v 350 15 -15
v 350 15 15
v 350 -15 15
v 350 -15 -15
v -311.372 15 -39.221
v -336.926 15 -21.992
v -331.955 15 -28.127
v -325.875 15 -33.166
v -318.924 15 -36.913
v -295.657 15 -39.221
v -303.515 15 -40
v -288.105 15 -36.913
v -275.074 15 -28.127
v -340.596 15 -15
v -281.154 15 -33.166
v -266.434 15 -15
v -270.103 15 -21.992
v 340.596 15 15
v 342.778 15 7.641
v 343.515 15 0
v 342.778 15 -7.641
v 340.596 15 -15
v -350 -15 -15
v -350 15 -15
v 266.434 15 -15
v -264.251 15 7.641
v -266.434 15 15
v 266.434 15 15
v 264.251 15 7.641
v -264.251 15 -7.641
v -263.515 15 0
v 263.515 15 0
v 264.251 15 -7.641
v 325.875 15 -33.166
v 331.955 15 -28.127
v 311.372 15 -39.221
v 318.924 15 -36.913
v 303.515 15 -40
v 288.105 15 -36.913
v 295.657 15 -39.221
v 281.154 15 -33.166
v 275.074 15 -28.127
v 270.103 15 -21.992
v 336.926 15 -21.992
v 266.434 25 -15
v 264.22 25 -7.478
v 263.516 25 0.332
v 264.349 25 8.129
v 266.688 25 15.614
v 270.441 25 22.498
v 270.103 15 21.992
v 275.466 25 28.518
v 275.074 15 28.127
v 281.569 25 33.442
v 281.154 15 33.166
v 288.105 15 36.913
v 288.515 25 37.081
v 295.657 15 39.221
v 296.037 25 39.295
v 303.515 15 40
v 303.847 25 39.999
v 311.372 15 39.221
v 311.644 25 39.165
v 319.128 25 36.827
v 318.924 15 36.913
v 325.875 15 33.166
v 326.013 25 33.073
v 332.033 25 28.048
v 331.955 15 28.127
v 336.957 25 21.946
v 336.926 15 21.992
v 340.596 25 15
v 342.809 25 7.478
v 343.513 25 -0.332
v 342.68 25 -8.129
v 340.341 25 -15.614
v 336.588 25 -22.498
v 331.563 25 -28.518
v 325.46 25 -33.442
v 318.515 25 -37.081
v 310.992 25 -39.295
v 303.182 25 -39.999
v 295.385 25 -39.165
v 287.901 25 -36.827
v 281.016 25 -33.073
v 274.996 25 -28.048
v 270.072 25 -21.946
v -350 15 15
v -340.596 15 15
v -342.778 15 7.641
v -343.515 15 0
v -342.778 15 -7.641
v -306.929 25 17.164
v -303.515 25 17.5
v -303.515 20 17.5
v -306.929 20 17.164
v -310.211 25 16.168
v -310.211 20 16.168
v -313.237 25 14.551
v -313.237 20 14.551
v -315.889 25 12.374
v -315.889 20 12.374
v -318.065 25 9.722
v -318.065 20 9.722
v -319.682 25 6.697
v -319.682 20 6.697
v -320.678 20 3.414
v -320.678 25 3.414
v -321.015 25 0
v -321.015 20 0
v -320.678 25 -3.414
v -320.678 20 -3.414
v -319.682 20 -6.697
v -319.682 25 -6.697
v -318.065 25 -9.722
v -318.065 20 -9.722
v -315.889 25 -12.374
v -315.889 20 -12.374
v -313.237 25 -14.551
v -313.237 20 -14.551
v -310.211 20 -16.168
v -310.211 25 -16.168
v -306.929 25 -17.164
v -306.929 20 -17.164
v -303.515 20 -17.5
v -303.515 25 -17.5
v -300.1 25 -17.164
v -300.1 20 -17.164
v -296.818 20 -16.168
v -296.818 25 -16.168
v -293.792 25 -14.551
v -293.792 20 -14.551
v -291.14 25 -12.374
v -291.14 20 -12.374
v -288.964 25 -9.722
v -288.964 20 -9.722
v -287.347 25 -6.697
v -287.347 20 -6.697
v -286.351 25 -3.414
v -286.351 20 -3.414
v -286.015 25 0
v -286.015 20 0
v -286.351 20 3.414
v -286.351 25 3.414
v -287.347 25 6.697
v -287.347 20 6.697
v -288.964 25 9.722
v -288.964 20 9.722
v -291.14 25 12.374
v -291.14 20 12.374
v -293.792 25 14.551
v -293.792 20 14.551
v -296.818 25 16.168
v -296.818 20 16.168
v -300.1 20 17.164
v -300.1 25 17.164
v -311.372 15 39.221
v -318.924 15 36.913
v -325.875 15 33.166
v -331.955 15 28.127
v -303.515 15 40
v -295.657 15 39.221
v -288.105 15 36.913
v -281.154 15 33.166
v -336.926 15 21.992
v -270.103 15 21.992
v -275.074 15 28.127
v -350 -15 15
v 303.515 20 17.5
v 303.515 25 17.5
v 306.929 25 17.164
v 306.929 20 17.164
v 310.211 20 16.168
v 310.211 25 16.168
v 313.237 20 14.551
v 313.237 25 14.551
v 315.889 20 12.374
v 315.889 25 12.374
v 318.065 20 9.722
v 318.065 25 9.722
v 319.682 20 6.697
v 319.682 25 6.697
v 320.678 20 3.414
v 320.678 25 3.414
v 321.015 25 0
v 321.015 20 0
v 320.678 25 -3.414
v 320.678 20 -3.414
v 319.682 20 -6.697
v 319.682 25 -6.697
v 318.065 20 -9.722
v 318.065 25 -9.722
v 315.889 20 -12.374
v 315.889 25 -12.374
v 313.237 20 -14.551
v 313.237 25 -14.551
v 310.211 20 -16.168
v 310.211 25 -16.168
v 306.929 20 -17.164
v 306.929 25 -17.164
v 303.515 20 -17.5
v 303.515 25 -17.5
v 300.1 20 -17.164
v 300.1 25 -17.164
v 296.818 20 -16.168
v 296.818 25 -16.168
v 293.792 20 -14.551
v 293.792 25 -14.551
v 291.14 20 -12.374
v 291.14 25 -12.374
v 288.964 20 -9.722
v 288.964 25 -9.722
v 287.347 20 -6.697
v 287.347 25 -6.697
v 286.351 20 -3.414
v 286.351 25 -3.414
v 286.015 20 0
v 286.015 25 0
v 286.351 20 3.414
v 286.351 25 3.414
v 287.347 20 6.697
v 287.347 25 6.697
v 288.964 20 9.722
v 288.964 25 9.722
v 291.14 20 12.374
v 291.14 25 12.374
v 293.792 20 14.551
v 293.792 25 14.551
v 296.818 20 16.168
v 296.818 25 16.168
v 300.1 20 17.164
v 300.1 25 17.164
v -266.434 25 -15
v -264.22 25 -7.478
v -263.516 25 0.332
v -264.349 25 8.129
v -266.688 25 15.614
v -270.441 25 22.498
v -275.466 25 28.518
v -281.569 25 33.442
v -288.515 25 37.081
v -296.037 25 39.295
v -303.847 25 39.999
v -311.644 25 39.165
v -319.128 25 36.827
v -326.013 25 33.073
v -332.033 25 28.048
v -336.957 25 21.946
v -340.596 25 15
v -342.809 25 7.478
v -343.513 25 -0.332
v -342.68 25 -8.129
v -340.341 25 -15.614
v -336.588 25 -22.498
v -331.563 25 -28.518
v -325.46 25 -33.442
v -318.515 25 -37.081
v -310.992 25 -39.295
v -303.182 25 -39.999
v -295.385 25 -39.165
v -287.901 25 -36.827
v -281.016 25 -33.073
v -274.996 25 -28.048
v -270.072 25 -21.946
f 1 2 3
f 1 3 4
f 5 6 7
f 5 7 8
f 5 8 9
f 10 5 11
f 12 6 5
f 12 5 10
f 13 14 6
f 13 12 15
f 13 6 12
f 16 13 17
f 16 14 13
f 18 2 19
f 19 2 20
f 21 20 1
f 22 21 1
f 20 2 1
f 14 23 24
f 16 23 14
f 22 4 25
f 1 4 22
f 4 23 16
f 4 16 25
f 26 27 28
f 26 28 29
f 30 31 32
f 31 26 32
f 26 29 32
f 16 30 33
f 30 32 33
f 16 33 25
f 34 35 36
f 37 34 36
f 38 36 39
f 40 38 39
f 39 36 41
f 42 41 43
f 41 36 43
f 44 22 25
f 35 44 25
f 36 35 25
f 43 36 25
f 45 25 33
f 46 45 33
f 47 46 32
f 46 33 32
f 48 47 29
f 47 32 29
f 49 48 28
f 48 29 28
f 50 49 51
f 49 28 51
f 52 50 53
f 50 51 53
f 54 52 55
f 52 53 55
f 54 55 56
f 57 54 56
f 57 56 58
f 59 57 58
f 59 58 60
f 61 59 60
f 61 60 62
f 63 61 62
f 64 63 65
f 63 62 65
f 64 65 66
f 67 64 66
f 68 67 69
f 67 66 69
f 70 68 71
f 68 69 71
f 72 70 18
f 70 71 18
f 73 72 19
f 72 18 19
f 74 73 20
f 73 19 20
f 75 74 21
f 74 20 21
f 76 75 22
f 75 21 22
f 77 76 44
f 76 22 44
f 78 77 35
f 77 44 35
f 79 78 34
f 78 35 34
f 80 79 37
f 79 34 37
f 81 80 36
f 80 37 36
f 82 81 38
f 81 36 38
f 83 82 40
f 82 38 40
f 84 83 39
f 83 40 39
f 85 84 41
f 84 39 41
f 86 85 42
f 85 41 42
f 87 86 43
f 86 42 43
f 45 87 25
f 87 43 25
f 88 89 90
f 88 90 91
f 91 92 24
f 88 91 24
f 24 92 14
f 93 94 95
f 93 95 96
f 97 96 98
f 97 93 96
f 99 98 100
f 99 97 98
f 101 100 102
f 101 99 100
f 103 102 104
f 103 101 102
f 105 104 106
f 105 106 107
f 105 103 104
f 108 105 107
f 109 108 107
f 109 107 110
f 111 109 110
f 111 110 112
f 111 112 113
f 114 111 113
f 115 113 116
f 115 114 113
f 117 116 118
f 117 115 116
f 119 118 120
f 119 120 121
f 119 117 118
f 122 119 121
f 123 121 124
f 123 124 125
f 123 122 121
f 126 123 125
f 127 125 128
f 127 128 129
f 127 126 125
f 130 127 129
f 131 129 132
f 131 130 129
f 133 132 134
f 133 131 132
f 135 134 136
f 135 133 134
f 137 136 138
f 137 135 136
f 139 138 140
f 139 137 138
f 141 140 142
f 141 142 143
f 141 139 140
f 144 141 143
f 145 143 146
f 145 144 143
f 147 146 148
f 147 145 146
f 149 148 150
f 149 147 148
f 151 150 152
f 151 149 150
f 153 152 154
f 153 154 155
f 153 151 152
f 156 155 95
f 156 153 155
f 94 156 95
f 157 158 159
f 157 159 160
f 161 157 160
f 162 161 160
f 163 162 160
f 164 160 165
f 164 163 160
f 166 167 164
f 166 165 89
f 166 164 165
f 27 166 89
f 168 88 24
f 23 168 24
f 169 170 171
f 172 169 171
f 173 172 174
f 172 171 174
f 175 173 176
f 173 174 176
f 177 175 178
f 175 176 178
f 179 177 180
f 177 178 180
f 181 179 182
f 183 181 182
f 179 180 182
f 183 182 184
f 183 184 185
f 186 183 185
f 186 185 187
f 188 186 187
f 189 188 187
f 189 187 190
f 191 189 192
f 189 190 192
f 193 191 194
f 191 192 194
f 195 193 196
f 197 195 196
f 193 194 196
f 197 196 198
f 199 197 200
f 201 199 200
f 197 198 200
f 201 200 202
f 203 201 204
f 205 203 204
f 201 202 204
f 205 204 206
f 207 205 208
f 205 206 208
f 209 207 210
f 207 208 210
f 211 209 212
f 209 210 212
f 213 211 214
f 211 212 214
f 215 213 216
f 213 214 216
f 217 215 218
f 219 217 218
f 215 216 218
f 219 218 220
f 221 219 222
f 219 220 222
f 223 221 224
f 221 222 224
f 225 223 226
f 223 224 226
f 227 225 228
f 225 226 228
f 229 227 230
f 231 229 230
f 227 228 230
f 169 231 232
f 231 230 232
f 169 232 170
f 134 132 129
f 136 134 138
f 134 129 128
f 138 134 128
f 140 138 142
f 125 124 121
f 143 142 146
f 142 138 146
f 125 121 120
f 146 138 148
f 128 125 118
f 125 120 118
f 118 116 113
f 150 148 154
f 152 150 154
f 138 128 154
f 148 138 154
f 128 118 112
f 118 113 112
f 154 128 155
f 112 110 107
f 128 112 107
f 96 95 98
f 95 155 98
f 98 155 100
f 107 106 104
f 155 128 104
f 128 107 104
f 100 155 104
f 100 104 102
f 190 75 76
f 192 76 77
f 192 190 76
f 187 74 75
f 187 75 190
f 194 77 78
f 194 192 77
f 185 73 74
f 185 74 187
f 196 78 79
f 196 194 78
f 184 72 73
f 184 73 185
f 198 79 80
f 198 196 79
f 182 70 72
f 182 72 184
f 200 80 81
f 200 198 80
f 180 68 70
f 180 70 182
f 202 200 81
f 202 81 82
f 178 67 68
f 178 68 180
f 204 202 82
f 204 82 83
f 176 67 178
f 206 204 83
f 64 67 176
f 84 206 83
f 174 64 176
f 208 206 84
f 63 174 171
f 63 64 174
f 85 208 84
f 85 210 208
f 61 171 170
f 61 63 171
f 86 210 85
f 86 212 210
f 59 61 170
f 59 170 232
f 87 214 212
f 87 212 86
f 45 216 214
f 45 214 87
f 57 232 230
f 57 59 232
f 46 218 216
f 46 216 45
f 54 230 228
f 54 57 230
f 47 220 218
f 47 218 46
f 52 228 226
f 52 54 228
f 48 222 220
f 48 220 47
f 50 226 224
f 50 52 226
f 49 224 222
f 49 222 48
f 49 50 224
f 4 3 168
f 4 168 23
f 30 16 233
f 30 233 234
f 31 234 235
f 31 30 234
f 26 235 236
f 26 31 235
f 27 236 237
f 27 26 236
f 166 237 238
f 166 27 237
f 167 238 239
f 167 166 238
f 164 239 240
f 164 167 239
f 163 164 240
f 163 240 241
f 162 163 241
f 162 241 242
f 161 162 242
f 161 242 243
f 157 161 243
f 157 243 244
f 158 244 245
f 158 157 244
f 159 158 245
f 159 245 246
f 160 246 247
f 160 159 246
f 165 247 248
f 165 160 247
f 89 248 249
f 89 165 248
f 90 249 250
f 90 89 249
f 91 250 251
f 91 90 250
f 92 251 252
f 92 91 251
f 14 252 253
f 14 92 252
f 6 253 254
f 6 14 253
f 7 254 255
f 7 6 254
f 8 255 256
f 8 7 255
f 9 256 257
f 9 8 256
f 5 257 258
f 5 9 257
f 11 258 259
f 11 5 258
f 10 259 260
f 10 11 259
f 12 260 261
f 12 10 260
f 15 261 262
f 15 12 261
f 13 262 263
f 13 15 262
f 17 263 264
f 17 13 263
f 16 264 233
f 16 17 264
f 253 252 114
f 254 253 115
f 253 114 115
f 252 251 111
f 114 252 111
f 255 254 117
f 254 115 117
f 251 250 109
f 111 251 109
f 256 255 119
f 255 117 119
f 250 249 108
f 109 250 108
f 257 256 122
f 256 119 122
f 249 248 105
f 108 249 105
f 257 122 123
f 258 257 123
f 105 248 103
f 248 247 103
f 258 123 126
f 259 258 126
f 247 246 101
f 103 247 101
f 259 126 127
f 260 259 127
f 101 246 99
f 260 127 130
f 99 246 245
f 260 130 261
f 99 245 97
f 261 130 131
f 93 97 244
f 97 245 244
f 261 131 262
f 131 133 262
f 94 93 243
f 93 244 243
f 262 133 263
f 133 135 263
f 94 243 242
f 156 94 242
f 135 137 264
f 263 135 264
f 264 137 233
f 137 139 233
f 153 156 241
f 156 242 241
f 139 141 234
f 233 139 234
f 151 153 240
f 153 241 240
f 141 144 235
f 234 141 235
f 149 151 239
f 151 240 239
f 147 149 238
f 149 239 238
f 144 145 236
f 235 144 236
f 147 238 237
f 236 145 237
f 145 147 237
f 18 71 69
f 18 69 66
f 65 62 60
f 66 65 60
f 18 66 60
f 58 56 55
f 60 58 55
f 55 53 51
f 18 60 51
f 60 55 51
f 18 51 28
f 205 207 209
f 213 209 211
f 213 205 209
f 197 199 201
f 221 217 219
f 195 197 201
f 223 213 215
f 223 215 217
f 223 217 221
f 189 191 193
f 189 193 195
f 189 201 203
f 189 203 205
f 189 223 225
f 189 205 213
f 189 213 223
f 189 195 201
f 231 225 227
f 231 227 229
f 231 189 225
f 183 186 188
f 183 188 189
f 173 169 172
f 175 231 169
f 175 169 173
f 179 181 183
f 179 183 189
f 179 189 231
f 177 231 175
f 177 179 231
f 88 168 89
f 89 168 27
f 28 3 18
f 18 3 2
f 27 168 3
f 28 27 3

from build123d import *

# Parameters (mm, degrees)
SKETCH1_W           = 30
SKETCH1_H           = 30
BOSS_EXTRUDE1_DEPTH = 350
SKETCH2_R           = 40
BOSS_EXTRUDE2_DEPTH = 10
SKETCH3_R           = 17.5
CUT_EXTRUDE1_DEPTH  = 5


with BuildPart() as part:
    # Sketch1 → Boss-Extrude1 (new, symmetric)
    with BuildSketch(Plane(origin=(0, 0, 0), x_dir=(0, 0, -1), z_dir=(1, 0, 0))):
        Rectangle(SKETCH1_W, SKETCH1_H)
    extrude(amount=BOSS_EXTRUDE1_DEPTH, both=True)

    # Sketch2 → Boss-Extrude2 (add)
    with BuildSketch(Plane(origin=(0, 15, 0), x_dir=(1, 0, 0), z_dir=(0, 1, 0))):
        with Locations(Location((303.514520503, 0, 0), (0, 0, 157.975687163))):
            Circle(SKETCH2_R)
    boss_extrude2 = extrude(amount=BOSS_EXTRUDE2_DEPTH)

    # Sketch3 → Cut-Extrude1 (cut)
    with BuildSketch(Plane(origin=(0, 25, 0), x_dir=(1, 0, 0), z_dir=(0, 1, 0))):
        with Locations(Location((303.514520503, 0, 0), (0, 0, 270))):
            Circle(SKETCH3_R)
    cut_extrude1 = extrude(amount=-CUT_EXTRUDE1_DEPTH, mode=Mode.SUBTRACT)

    # Mirror1: Boss-Extrude2, Cut-Extrude1 across plane
    add(boss_extrude2.mirror(Plane(origin=(0, 0, 0), x_dir=(0, 0, 1), z_dir=(1, 0, 0))))
    add(cut_extrude1.mirror(Plane(origin=(0, 0, 0), x_dir=(0, 0, 1), z_dir=(1, 0, 0))), mode=Mode.SUBTRACT)


solid = part.part
